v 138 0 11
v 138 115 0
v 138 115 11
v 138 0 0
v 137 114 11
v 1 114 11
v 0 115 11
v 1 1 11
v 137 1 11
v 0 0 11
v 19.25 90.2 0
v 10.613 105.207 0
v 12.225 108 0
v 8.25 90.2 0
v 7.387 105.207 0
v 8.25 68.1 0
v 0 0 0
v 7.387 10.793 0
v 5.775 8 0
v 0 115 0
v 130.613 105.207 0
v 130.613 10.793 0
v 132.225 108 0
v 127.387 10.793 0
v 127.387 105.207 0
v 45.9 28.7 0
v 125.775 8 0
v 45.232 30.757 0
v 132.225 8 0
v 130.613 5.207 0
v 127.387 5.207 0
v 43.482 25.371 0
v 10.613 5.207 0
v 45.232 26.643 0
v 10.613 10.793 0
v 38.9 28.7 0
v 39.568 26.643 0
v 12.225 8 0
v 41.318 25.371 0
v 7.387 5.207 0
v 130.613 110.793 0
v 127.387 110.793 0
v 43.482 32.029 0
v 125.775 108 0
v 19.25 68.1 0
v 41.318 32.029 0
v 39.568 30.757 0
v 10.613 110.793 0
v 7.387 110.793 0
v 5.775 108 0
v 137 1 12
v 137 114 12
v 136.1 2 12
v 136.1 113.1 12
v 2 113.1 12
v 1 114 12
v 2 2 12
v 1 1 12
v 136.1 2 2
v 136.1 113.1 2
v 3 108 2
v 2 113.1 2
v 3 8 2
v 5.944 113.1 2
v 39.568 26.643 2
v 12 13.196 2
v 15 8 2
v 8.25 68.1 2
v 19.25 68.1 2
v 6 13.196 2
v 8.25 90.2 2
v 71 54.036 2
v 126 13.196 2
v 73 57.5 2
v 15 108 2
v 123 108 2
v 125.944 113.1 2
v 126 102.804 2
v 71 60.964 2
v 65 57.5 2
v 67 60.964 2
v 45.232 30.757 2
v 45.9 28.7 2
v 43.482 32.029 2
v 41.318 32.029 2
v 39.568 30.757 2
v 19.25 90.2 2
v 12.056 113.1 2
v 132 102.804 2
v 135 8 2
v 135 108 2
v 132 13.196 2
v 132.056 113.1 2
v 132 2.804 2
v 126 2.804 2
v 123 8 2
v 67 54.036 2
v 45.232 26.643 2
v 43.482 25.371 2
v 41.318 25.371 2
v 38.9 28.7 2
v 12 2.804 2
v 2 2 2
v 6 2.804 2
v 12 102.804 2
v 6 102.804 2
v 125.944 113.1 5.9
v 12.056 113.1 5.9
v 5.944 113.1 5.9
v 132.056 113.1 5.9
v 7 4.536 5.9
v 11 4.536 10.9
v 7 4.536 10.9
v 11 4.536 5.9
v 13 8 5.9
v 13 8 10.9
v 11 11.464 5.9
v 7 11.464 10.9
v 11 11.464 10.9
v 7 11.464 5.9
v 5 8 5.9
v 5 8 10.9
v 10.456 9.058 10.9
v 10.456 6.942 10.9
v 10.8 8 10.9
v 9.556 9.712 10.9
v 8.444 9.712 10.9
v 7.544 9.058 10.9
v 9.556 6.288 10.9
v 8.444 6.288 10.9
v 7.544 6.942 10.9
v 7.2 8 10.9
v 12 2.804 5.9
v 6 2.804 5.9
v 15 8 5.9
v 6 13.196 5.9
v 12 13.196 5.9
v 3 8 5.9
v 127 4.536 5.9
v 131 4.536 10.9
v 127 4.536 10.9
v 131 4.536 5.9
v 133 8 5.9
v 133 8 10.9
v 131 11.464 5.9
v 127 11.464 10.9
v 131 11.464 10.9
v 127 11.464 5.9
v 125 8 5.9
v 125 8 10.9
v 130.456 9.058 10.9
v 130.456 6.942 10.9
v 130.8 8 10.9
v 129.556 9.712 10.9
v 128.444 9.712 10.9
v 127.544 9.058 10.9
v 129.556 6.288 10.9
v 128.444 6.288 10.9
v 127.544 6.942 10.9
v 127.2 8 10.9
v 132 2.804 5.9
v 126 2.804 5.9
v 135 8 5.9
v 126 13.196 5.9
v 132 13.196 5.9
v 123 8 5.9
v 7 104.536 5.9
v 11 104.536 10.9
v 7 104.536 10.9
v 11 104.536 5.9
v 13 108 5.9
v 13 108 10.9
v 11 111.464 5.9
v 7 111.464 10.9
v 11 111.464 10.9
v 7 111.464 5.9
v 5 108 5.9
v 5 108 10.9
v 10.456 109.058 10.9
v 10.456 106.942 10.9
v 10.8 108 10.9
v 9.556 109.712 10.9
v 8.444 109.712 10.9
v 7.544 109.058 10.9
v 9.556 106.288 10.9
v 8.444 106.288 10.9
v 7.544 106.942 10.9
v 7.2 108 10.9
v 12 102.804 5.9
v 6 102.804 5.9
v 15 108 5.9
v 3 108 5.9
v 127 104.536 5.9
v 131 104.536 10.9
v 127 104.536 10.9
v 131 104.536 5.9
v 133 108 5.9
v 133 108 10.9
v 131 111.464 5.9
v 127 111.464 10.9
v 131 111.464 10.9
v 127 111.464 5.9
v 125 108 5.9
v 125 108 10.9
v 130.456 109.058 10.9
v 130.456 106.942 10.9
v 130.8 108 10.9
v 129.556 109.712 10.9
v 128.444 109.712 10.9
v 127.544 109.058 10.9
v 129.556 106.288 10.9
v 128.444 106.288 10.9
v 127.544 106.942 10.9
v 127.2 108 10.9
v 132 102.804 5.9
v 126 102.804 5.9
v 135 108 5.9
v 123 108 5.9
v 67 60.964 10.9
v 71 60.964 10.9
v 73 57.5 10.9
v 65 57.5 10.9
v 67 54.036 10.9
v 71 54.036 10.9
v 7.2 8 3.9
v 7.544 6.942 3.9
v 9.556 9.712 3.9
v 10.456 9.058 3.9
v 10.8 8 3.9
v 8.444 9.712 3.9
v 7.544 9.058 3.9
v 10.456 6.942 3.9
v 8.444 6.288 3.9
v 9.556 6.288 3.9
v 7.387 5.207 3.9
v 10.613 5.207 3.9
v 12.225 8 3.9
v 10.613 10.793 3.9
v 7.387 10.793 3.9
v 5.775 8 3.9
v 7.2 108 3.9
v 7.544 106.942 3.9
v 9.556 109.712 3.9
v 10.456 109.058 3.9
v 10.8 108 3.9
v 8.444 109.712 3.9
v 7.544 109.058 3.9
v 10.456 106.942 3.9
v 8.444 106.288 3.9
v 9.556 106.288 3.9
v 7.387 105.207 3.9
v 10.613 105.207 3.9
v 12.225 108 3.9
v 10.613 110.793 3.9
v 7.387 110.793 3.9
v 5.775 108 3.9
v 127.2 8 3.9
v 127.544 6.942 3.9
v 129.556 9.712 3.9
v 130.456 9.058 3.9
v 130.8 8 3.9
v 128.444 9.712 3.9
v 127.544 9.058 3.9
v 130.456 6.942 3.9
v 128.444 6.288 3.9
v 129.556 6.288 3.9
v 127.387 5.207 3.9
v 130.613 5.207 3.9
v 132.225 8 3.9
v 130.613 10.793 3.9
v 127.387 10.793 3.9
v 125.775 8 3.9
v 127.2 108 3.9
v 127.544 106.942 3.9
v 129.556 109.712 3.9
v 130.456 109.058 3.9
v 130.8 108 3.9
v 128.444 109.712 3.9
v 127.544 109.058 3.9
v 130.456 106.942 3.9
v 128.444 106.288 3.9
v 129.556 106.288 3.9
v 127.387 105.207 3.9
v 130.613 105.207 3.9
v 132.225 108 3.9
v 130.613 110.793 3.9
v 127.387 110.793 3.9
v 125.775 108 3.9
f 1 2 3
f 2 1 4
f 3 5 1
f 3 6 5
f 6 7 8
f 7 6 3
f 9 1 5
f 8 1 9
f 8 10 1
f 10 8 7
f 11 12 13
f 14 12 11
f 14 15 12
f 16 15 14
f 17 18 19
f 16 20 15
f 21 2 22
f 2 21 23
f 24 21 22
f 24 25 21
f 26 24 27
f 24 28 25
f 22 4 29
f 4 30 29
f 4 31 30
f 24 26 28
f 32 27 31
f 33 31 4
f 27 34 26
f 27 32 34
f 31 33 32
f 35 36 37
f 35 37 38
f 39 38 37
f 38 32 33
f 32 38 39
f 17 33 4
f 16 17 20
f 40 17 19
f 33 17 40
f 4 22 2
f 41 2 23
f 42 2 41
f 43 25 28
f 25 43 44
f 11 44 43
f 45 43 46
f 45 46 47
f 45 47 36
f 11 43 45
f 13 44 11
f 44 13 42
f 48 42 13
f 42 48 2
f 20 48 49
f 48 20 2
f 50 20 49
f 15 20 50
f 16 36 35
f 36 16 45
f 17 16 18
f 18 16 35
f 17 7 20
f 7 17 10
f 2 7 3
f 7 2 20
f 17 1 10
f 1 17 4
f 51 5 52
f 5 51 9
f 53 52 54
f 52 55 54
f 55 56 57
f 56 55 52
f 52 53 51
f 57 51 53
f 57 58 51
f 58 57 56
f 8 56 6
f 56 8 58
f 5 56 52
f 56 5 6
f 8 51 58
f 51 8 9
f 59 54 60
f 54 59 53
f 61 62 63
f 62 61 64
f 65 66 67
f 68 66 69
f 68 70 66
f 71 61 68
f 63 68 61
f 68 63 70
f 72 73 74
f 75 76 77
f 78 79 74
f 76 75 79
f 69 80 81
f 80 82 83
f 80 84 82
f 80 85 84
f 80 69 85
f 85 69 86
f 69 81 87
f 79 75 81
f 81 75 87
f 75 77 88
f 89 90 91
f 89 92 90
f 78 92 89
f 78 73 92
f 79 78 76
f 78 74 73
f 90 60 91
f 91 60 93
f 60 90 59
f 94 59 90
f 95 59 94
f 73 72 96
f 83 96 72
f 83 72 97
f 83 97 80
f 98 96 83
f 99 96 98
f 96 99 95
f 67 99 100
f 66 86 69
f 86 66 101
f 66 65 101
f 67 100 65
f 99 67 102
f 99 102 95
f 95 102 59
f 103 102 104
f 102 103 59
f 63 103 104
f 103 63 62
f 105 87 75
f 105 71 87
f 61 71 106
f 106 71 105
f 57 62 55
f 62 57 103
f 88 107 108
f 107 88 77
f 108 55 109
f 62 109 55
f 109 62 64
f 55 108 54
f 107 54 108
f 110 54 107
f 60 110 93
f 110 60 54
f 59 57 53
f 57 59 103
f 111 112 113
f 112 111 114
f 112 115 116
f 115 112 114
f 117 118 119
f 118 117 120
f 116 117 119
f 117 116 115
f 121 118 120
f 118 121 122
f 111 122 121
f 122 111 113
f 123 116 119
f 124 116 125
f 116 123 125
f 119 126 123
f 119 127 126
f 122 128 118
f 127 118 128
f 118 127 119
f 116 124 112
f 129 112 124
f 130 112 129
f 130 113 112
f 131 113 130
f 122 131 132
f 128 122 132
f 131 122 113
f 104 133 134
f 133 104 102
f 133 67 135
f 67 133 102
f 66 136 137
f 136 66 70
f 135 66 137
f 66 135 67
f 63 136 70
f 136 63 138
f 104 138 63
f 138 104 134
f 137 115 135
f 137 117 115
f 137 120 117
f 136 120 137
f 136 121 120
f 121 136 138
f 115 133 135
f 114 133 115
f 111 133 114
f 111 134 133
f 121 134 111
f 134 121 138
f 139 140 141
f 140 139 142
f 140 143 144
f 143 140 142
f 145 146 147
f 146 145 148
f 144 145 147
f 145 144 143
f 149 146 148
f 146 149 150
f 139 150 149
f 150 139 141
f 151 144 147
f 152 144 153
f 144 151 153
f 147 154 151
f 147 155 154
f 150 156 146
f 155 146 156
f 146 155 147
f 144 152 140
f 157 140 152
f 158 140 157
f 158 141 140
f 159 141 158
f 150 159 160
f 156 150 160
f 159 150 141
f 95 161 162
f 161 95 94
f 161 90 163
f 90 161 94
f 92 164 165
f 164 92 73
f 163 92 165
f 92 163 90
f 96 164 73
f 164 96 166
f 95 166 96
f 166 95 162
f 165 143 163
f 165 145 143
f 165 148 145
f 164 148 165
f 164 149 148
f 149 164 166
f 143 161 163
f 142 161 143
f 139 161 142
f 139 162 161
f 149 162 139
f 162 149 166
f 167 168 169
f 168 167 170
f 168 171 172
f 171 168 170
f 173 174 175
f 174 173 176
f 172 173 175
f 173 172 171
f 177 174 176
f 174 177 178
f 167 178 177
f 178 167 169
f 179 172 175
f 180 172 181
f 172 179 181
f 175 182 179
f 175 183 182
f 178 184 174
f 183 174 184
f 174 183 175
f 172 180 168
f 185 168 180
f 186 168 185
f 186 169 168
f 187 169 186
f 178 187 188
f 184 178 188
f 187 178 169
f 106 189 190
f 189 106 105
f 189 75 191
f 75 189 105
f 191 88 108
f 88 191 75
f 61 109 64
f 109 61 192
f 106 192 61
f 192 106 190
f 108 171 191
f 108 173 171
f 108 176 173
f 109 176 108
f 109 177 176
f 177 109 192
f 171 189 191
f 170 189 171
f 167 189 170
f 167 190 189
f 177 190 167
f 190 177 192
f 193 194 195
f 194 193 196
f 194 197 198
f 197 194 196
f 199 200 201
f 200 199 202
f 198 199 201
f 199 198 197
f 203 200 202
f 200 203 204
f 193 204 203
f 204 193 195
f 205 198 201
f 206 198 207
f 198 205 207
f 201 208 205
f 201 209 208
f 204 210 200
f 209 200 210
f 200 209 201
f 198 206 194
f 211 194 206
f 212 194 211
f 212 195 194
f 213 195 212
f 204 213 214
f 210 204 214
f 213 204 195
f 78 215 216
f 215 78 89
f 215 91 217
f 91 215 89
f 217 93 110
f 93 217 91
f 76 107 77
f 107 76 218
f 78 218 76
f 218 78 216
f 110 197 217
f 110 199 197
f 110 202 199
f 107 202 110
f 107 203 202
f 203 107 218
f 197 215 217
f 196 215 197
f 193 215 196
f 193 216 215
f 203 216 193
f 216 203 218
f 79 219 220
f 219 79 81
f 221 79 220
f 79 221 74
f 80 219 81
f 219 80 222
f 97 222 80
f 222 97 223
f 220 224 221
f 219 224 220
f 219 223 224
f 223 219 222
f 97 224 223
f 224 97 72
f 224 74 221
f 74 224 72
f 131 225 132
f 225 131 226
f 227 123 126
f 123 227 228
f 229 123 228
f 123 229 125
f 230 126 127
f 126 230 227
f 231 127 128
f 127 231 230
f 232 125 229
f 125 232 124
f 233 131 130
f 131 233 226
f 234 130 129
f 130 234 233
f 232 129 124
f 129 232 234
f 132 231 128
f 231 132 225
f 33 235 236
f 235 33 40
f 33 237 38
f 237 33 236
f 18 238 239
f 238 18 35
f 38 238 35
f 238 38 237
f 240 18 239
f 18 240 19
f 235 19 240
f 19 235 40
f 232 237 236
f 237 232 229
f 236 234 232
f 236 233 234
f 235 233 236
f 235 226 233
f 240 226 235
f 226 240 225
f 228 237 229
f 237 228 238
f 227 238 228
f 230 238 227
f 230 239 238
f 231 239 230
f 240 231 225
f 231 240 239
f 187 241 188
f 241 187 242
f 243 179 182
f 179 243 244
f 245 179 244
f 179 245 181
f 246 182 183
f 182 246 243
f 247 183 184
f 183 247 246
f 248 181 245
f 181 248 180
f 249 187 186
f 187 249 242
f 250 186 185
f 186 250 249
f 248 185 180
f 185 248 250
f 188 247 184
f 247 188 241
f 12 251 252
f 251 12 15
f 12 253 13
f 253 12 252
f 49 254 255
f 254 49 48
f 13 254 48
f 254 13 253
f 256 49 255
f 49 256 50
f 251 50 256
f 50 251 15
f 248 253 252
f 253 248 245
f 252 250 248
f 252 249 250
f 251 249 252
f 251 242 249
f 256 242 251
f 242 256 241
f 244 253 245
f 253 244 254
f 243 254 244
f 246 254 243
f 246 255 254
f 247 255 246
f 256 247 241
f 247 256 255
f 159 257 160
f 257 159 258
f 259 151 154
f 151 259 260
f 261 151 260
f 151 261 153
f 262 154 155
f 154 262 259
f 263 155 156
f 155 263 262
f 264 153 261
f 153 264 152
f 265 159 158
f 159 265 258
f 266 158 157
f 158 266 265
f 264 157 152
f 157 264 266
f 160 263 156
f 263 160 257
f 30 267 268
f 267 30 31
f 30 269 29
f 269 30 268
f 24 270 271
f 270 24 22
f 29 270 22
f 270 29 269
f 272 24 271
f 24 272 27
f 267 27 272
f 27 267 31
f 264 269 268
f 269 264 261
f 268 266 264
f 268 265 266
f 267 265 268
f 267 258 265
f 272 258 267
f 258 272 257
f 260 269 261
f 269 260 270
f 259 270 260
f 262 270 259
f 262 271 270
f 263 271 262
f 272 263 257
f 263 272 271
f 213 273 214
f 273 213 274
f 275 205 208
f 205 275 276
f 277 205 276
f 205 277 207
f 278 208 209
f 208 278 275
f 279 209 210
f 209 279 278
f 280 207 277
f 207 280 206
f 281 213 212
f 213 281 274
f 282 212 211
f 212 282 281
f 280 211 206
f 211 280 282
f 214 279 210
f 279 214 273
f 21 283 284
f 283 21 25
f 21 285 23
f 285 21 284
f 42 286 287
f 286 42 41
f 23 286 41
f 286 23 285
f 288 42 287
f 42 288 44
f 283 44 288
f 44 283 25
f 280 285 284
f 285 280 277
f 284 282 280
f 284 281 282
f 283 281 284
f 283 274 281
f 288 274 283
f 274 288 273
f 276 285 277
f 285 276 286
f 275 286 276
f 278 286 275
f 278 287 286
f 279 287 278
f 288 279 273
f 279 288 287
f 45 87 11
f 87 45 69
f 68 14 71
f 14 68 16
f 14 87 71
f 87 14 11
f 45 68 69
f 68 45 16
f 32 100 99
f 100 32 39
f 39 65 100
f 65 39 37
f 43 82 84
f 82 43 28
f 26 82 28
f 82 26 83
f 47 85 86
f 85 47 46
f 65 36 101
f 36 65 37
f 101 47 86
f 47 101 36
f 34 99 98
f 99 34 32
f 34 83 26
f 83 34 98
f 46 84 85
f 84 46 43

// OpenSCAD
tol = 0.5;
screen_tol = 0.8;
pcb_x = 130;
pcb_y = 110;
pcb_z = 4;
bolt_d = 3.6;
shift_bolt = 5;
board_w = 1;
board_h = 1;


// box thickness
th = 2;

shift_x = 4;
shift_y = th + 1;

box_x = pcb_x + shift_x + 4;
box_y = pcb_y + shift_y + th;

pcb_width = 2;
pcb_up = 9;

box_z = th + pcb_up + pcb_width - 1;

socket_h = 15;
socket_w = 10;
socket_n = 5;
socket_int = 20;
start_socket_x = 20 + shift_x;
eps = 1e-1;

usb_type_b_w = 12;
usb_type_b_h = 11;
start_type_b_y = shift_y + 81.5;
//start_type_b_z = th + pcb_z + tol;

usb_type_a_w = 14.4;
usb_type_a_h = 7.8;
start_type_a_y = shift_y + 46;
//start_type_a_z = th + pcb_z + tol;

// programmator
micro_x = 10;
micro_y = 21.1;
micro_start_x = shift_x + 4.75;
micro_start_y = shift_y + pcb_y - 23.3 - micro_y;

contrast_start_x = shift_x + 38.4;
contrast_start_y = shift_y + 25.7;
volume_start_x = shift_x + pcb_x - 39.2;
volume_start_y = contrast_start_y;
pot_d = 7;
under_pcb = 13;
fn = 10;
gaika_h = 4;
gaika_w = 5.5;
stoiki_r = 4;
wide_stoiki_r = stoiki_r + 2;



translate([0,0,-50]) {

!difference() {
  union() {
    difference() {
      union() {
        cube([box_x,box_y, box_z-board_h], false);
        translate([th - board_w, th - board_w, 0]) {
          cube([box_x - 2*(th - board_w), box_y - 2*(th -board_w), box_z], false);
        }
      }
      translate([th, th, th]) {
        cube([box_x-2*th+eps, box_y-2*th+eps, box_z-th+eps], false);
      }
    }
    // under_pcb, stoiki
    for (dy = [shift_y+shift_bolt, shift_y+pcb_y-shift_bolt]) {
      for (dx = [shift_x+shift_bolt, shift_x+pcb_x-shift_bolt]) {
//        translate([dx,dy,pcb_up/2+th-eps]) {
//          cube(size=[under_pcb,under_pcb,pcb_up], center=true);
//        }
        translate([dx,dy,th-eps]) {
          cylinder($fn=6, r=stoiki_r, h=pcb_up);
          cylinder($fn=6, r=wide_stoiki_r, h=gaika_h);
        }
      }
    }
    translate([box_x/2, box_y/2, th-eps]) {
      cylinder($fn=6, r=stoiki_r, h=pcb_up);
    }
  }

  // bolts
  for (dx = [shift_x+shift_bolt, shift_x+pcb_x-shift_bolt]) {
    for (dy = [shift_y+shift_bolt, shift_y+pcb_y-shift_bolt]) {
      translate([dx,dy,-eps]) {
        cylinder($fn=fn, r=bolt_d/2, h=th+pcb_up+2*eps);
        // gaika
        cylinder($fn=6, r=gaika_w / 2 / cos(30) + 0.05, h=gaika_h);
      }
    }
  }

//    // usb_in1 type b
//    translate([box_x-th-eps, start_type_b_y-tol, start_type_b_z]) {
//        cube(size=[th+2*eps, usb_type_b_w+2*tol, box_z]);
//    }

//    // usb_out1 type a
//    translate([-eps, start_type_a_y - tol, start_type_a_z]) {
//        cube(size=[th+2*eps, usb_type_a_w + 2*tol, box_z]);
//    }

    // programmator
    translate([micro_start_x-tol,micro_start_y-tol, -eps]) {
      cube(size=[micro_x+2*tol, micro_y+2*tol, th+2*eps]);
    }

    // contrast
    translate([contrast_start_x, contrast_start_y, -eps]) {
      cylinder($fn=fn, r=pot_d/2, h=th+2*eps);
    }

    // volume
//    translate([volume_start_x, volume_start_y, -eps]) {
//      cylinder($fn=20, r=pot_d/2, h=th+2*eps);
//    }
}
}

top_box_z = 15 + th;
stoiki_h = top_box_z - th;
wide_stoiki_h = 4;
pcb_room = 1;
screen_start_x = shift_x + 29;
screen_start_y = shift_y + 38.9;
screen_length_x = 71.2;
screen_length_y = 24.2;
screen_hold_x = 40;
screen_hold_y = 4;
screen_hold_start_z = 12.5;
screen_hold_y_shift = 2;
screen_hold_up_x = 15;
screen_hold_up_x_shift = 5;

master_button_y = shift_y + 10;
master_button_x = shift_x + 43;
master_button_int = 21.8;
master_button_r = 3;
top_bolt_h = 1.5;
top_bolt_r = 3.5;
speaker_shift = 18;
speaker_r = 15;
speaker_h = 15;
speaker_hole_d = 10;
speaker_hole_int = 3;
speaker_hole_w = 1.5;
speaker_shift = 18;

difference() {
  union() {
    difference() {
      cube([box_x,box_y,top_box_z], false);
      translate([th, th, -eps]) {
        cube([box_x-2*th+eps, box_y-2*th+eps, top_box_z-th+eps], false);
      }
    }
    // stoiki
    for (dx = [shift_x+shift_bolt, shift_x+pcb_x-shift_bolt]) {
      for (dy = [shift_y+shift_bolt, shift_y+pcb_y-shift_bolt]) {
        translate([dx,dy,pcb_room]) {
          cylinder($fn=6, r=stoiki_r, h=top_box_z-th+eps);
        }
        translate([dx,dy,top_box_z-th-wide_stoiki_h+eps]) {
          cylinder($fn=6, r=wide_stoiki_r, h=wide_stoiki_h+th-2*eps);
        }
      }
    }
    // screen_hold
    translate([screen_start_x + (screen_length_x - screen_hold_x)/2, screen_start_y - screen_hold_y_shift - screen_hold_y, screen_hold_start_z]) {
	cube([screen_hold_x, screen_hold_y, top_box_z - screen_hold_start_z - th + eps]);
    }
    translate([screen_start_x + screen_length_x - screen_hold_up_x - screen_hold_up_x_shift, screen_start_y + screen_length_y + screen_hold_y_shift, screen_hold_start_z]) {
	cube([screen_hold_up_x, screen_hold_y, top_box_z - screen_hold_start_z - th + eps]);
    }
  }
  // - speaker na stoikah
  translate([shift_x + pcb_x - 18, shift_y + 18, 0]) {
    cylinder(r=speaker_r, h = 15, $fn=20);
  }
  // speaker_hole
  for (dy = [shift_y + speaker_shift - speaker_hole_int - speaker_hole_w*3/2, 
             shift_y + speaker_shift - speaker_hole_w/2, 
             shift_y + speaker_shift + speaker_hole_int + speaker_hole_w/2]) { 
    translate([shift_x + pcb_x - speaker_shift - speaker_hole_d, dy, top_box_z-th-eps]) {
      cube(size=[speaker_hole_d, speaker_hole_w, th + 2*eps]);
    }
  }

  // bolts
  for (dx = [shift_x+shift_bolt, shift_x+pcb_x-shift_bolt]) {
    for (dy = [shift_y+shift_bolt, shift_y+pcb_y-shift_bolt]) {
      translate([dx,dy,-eps]) {
        cylinder($fn=fn, r=bolt_d/2, h=top_box_z+2*eps);
      }
      translate([dx, dy, top_box_z - wide_stoiki_h]) {
        cylinder($fn=6, r=gaika_w / 2 / cos(30) + 0.05, h=wide_stoiki_h+eps);
        //cylinder($fn=6, r=top_bolt_r, h=top_bolt_h + eps);
      }
    }
  }

  // screen
  translate([screen_start_x - screen_tol, screen_start_y - screen_tol, top_box_z - th - eps]) {
      cube([screen_length_x + 2*screen_tol, screen_length_y + 2*screen_tol, th + 2*eps]);
  }
  // sockets
  for (i = [0:1:socket_n-1]) {
      translate([start_socket_x+i*socket_int - tol, box_y-th-eps, -eps]) {
        cube(size=[socket_w + 2*tol, th+2*eps, socket_h]);
      }
  }
  // type_b
  translate([box_x - th - eps, start_type_b_y - tol, -tol]) {
      cube([th + 2*eps, usb_type_b_w + 2*tol, usb_type_b_h + 2*tol]);
  }
  // type_a
  translate([-eps, start_type_a_y - tol, -eps]) {
      cube([th + 2*eps, usb_type_a_w + 2*tol, usb_type_a_h + 2*eps]);
  }
  // master buttons
  for (i = [0:1:2]) {
    translate([master_button_x + master_button_int*i, master_button_y, top_box_z - th - eps]) {
      cylinder($fn=fn, r=master_button_r + tol, h=th+2*eps);
    }
  }
}


//// bolts
//for (dx = [shift_x+shift_bolt, shift_x+pcb_x-shift_bolt]) {
//  for (dy = [shift_y+shift_bolt, shift_y+pcb_y-shift_bolt]) {
//    difference() {
//      translate([dx,dy,pcb_up/2+th]) {
//        cube(size=[a,a,pcb_up], center=true);
//      }
//      translate([dx,dy,-eps]) {
//        cylinder($fn=20, r=bolt_d/2, h=th+pcb_up+2*eps);
//      }
//    }
//  }
//}


//leg_r = t;
//shift = t/2+leg_r;
//for (dx = [shift, a-shift])
//    for (dy = [shift, b-shift]) {
//        translate([dx, dy, 0]) {
//            cylinder(h=c, r=leg_r, $fn=40);
//        }
//    }
